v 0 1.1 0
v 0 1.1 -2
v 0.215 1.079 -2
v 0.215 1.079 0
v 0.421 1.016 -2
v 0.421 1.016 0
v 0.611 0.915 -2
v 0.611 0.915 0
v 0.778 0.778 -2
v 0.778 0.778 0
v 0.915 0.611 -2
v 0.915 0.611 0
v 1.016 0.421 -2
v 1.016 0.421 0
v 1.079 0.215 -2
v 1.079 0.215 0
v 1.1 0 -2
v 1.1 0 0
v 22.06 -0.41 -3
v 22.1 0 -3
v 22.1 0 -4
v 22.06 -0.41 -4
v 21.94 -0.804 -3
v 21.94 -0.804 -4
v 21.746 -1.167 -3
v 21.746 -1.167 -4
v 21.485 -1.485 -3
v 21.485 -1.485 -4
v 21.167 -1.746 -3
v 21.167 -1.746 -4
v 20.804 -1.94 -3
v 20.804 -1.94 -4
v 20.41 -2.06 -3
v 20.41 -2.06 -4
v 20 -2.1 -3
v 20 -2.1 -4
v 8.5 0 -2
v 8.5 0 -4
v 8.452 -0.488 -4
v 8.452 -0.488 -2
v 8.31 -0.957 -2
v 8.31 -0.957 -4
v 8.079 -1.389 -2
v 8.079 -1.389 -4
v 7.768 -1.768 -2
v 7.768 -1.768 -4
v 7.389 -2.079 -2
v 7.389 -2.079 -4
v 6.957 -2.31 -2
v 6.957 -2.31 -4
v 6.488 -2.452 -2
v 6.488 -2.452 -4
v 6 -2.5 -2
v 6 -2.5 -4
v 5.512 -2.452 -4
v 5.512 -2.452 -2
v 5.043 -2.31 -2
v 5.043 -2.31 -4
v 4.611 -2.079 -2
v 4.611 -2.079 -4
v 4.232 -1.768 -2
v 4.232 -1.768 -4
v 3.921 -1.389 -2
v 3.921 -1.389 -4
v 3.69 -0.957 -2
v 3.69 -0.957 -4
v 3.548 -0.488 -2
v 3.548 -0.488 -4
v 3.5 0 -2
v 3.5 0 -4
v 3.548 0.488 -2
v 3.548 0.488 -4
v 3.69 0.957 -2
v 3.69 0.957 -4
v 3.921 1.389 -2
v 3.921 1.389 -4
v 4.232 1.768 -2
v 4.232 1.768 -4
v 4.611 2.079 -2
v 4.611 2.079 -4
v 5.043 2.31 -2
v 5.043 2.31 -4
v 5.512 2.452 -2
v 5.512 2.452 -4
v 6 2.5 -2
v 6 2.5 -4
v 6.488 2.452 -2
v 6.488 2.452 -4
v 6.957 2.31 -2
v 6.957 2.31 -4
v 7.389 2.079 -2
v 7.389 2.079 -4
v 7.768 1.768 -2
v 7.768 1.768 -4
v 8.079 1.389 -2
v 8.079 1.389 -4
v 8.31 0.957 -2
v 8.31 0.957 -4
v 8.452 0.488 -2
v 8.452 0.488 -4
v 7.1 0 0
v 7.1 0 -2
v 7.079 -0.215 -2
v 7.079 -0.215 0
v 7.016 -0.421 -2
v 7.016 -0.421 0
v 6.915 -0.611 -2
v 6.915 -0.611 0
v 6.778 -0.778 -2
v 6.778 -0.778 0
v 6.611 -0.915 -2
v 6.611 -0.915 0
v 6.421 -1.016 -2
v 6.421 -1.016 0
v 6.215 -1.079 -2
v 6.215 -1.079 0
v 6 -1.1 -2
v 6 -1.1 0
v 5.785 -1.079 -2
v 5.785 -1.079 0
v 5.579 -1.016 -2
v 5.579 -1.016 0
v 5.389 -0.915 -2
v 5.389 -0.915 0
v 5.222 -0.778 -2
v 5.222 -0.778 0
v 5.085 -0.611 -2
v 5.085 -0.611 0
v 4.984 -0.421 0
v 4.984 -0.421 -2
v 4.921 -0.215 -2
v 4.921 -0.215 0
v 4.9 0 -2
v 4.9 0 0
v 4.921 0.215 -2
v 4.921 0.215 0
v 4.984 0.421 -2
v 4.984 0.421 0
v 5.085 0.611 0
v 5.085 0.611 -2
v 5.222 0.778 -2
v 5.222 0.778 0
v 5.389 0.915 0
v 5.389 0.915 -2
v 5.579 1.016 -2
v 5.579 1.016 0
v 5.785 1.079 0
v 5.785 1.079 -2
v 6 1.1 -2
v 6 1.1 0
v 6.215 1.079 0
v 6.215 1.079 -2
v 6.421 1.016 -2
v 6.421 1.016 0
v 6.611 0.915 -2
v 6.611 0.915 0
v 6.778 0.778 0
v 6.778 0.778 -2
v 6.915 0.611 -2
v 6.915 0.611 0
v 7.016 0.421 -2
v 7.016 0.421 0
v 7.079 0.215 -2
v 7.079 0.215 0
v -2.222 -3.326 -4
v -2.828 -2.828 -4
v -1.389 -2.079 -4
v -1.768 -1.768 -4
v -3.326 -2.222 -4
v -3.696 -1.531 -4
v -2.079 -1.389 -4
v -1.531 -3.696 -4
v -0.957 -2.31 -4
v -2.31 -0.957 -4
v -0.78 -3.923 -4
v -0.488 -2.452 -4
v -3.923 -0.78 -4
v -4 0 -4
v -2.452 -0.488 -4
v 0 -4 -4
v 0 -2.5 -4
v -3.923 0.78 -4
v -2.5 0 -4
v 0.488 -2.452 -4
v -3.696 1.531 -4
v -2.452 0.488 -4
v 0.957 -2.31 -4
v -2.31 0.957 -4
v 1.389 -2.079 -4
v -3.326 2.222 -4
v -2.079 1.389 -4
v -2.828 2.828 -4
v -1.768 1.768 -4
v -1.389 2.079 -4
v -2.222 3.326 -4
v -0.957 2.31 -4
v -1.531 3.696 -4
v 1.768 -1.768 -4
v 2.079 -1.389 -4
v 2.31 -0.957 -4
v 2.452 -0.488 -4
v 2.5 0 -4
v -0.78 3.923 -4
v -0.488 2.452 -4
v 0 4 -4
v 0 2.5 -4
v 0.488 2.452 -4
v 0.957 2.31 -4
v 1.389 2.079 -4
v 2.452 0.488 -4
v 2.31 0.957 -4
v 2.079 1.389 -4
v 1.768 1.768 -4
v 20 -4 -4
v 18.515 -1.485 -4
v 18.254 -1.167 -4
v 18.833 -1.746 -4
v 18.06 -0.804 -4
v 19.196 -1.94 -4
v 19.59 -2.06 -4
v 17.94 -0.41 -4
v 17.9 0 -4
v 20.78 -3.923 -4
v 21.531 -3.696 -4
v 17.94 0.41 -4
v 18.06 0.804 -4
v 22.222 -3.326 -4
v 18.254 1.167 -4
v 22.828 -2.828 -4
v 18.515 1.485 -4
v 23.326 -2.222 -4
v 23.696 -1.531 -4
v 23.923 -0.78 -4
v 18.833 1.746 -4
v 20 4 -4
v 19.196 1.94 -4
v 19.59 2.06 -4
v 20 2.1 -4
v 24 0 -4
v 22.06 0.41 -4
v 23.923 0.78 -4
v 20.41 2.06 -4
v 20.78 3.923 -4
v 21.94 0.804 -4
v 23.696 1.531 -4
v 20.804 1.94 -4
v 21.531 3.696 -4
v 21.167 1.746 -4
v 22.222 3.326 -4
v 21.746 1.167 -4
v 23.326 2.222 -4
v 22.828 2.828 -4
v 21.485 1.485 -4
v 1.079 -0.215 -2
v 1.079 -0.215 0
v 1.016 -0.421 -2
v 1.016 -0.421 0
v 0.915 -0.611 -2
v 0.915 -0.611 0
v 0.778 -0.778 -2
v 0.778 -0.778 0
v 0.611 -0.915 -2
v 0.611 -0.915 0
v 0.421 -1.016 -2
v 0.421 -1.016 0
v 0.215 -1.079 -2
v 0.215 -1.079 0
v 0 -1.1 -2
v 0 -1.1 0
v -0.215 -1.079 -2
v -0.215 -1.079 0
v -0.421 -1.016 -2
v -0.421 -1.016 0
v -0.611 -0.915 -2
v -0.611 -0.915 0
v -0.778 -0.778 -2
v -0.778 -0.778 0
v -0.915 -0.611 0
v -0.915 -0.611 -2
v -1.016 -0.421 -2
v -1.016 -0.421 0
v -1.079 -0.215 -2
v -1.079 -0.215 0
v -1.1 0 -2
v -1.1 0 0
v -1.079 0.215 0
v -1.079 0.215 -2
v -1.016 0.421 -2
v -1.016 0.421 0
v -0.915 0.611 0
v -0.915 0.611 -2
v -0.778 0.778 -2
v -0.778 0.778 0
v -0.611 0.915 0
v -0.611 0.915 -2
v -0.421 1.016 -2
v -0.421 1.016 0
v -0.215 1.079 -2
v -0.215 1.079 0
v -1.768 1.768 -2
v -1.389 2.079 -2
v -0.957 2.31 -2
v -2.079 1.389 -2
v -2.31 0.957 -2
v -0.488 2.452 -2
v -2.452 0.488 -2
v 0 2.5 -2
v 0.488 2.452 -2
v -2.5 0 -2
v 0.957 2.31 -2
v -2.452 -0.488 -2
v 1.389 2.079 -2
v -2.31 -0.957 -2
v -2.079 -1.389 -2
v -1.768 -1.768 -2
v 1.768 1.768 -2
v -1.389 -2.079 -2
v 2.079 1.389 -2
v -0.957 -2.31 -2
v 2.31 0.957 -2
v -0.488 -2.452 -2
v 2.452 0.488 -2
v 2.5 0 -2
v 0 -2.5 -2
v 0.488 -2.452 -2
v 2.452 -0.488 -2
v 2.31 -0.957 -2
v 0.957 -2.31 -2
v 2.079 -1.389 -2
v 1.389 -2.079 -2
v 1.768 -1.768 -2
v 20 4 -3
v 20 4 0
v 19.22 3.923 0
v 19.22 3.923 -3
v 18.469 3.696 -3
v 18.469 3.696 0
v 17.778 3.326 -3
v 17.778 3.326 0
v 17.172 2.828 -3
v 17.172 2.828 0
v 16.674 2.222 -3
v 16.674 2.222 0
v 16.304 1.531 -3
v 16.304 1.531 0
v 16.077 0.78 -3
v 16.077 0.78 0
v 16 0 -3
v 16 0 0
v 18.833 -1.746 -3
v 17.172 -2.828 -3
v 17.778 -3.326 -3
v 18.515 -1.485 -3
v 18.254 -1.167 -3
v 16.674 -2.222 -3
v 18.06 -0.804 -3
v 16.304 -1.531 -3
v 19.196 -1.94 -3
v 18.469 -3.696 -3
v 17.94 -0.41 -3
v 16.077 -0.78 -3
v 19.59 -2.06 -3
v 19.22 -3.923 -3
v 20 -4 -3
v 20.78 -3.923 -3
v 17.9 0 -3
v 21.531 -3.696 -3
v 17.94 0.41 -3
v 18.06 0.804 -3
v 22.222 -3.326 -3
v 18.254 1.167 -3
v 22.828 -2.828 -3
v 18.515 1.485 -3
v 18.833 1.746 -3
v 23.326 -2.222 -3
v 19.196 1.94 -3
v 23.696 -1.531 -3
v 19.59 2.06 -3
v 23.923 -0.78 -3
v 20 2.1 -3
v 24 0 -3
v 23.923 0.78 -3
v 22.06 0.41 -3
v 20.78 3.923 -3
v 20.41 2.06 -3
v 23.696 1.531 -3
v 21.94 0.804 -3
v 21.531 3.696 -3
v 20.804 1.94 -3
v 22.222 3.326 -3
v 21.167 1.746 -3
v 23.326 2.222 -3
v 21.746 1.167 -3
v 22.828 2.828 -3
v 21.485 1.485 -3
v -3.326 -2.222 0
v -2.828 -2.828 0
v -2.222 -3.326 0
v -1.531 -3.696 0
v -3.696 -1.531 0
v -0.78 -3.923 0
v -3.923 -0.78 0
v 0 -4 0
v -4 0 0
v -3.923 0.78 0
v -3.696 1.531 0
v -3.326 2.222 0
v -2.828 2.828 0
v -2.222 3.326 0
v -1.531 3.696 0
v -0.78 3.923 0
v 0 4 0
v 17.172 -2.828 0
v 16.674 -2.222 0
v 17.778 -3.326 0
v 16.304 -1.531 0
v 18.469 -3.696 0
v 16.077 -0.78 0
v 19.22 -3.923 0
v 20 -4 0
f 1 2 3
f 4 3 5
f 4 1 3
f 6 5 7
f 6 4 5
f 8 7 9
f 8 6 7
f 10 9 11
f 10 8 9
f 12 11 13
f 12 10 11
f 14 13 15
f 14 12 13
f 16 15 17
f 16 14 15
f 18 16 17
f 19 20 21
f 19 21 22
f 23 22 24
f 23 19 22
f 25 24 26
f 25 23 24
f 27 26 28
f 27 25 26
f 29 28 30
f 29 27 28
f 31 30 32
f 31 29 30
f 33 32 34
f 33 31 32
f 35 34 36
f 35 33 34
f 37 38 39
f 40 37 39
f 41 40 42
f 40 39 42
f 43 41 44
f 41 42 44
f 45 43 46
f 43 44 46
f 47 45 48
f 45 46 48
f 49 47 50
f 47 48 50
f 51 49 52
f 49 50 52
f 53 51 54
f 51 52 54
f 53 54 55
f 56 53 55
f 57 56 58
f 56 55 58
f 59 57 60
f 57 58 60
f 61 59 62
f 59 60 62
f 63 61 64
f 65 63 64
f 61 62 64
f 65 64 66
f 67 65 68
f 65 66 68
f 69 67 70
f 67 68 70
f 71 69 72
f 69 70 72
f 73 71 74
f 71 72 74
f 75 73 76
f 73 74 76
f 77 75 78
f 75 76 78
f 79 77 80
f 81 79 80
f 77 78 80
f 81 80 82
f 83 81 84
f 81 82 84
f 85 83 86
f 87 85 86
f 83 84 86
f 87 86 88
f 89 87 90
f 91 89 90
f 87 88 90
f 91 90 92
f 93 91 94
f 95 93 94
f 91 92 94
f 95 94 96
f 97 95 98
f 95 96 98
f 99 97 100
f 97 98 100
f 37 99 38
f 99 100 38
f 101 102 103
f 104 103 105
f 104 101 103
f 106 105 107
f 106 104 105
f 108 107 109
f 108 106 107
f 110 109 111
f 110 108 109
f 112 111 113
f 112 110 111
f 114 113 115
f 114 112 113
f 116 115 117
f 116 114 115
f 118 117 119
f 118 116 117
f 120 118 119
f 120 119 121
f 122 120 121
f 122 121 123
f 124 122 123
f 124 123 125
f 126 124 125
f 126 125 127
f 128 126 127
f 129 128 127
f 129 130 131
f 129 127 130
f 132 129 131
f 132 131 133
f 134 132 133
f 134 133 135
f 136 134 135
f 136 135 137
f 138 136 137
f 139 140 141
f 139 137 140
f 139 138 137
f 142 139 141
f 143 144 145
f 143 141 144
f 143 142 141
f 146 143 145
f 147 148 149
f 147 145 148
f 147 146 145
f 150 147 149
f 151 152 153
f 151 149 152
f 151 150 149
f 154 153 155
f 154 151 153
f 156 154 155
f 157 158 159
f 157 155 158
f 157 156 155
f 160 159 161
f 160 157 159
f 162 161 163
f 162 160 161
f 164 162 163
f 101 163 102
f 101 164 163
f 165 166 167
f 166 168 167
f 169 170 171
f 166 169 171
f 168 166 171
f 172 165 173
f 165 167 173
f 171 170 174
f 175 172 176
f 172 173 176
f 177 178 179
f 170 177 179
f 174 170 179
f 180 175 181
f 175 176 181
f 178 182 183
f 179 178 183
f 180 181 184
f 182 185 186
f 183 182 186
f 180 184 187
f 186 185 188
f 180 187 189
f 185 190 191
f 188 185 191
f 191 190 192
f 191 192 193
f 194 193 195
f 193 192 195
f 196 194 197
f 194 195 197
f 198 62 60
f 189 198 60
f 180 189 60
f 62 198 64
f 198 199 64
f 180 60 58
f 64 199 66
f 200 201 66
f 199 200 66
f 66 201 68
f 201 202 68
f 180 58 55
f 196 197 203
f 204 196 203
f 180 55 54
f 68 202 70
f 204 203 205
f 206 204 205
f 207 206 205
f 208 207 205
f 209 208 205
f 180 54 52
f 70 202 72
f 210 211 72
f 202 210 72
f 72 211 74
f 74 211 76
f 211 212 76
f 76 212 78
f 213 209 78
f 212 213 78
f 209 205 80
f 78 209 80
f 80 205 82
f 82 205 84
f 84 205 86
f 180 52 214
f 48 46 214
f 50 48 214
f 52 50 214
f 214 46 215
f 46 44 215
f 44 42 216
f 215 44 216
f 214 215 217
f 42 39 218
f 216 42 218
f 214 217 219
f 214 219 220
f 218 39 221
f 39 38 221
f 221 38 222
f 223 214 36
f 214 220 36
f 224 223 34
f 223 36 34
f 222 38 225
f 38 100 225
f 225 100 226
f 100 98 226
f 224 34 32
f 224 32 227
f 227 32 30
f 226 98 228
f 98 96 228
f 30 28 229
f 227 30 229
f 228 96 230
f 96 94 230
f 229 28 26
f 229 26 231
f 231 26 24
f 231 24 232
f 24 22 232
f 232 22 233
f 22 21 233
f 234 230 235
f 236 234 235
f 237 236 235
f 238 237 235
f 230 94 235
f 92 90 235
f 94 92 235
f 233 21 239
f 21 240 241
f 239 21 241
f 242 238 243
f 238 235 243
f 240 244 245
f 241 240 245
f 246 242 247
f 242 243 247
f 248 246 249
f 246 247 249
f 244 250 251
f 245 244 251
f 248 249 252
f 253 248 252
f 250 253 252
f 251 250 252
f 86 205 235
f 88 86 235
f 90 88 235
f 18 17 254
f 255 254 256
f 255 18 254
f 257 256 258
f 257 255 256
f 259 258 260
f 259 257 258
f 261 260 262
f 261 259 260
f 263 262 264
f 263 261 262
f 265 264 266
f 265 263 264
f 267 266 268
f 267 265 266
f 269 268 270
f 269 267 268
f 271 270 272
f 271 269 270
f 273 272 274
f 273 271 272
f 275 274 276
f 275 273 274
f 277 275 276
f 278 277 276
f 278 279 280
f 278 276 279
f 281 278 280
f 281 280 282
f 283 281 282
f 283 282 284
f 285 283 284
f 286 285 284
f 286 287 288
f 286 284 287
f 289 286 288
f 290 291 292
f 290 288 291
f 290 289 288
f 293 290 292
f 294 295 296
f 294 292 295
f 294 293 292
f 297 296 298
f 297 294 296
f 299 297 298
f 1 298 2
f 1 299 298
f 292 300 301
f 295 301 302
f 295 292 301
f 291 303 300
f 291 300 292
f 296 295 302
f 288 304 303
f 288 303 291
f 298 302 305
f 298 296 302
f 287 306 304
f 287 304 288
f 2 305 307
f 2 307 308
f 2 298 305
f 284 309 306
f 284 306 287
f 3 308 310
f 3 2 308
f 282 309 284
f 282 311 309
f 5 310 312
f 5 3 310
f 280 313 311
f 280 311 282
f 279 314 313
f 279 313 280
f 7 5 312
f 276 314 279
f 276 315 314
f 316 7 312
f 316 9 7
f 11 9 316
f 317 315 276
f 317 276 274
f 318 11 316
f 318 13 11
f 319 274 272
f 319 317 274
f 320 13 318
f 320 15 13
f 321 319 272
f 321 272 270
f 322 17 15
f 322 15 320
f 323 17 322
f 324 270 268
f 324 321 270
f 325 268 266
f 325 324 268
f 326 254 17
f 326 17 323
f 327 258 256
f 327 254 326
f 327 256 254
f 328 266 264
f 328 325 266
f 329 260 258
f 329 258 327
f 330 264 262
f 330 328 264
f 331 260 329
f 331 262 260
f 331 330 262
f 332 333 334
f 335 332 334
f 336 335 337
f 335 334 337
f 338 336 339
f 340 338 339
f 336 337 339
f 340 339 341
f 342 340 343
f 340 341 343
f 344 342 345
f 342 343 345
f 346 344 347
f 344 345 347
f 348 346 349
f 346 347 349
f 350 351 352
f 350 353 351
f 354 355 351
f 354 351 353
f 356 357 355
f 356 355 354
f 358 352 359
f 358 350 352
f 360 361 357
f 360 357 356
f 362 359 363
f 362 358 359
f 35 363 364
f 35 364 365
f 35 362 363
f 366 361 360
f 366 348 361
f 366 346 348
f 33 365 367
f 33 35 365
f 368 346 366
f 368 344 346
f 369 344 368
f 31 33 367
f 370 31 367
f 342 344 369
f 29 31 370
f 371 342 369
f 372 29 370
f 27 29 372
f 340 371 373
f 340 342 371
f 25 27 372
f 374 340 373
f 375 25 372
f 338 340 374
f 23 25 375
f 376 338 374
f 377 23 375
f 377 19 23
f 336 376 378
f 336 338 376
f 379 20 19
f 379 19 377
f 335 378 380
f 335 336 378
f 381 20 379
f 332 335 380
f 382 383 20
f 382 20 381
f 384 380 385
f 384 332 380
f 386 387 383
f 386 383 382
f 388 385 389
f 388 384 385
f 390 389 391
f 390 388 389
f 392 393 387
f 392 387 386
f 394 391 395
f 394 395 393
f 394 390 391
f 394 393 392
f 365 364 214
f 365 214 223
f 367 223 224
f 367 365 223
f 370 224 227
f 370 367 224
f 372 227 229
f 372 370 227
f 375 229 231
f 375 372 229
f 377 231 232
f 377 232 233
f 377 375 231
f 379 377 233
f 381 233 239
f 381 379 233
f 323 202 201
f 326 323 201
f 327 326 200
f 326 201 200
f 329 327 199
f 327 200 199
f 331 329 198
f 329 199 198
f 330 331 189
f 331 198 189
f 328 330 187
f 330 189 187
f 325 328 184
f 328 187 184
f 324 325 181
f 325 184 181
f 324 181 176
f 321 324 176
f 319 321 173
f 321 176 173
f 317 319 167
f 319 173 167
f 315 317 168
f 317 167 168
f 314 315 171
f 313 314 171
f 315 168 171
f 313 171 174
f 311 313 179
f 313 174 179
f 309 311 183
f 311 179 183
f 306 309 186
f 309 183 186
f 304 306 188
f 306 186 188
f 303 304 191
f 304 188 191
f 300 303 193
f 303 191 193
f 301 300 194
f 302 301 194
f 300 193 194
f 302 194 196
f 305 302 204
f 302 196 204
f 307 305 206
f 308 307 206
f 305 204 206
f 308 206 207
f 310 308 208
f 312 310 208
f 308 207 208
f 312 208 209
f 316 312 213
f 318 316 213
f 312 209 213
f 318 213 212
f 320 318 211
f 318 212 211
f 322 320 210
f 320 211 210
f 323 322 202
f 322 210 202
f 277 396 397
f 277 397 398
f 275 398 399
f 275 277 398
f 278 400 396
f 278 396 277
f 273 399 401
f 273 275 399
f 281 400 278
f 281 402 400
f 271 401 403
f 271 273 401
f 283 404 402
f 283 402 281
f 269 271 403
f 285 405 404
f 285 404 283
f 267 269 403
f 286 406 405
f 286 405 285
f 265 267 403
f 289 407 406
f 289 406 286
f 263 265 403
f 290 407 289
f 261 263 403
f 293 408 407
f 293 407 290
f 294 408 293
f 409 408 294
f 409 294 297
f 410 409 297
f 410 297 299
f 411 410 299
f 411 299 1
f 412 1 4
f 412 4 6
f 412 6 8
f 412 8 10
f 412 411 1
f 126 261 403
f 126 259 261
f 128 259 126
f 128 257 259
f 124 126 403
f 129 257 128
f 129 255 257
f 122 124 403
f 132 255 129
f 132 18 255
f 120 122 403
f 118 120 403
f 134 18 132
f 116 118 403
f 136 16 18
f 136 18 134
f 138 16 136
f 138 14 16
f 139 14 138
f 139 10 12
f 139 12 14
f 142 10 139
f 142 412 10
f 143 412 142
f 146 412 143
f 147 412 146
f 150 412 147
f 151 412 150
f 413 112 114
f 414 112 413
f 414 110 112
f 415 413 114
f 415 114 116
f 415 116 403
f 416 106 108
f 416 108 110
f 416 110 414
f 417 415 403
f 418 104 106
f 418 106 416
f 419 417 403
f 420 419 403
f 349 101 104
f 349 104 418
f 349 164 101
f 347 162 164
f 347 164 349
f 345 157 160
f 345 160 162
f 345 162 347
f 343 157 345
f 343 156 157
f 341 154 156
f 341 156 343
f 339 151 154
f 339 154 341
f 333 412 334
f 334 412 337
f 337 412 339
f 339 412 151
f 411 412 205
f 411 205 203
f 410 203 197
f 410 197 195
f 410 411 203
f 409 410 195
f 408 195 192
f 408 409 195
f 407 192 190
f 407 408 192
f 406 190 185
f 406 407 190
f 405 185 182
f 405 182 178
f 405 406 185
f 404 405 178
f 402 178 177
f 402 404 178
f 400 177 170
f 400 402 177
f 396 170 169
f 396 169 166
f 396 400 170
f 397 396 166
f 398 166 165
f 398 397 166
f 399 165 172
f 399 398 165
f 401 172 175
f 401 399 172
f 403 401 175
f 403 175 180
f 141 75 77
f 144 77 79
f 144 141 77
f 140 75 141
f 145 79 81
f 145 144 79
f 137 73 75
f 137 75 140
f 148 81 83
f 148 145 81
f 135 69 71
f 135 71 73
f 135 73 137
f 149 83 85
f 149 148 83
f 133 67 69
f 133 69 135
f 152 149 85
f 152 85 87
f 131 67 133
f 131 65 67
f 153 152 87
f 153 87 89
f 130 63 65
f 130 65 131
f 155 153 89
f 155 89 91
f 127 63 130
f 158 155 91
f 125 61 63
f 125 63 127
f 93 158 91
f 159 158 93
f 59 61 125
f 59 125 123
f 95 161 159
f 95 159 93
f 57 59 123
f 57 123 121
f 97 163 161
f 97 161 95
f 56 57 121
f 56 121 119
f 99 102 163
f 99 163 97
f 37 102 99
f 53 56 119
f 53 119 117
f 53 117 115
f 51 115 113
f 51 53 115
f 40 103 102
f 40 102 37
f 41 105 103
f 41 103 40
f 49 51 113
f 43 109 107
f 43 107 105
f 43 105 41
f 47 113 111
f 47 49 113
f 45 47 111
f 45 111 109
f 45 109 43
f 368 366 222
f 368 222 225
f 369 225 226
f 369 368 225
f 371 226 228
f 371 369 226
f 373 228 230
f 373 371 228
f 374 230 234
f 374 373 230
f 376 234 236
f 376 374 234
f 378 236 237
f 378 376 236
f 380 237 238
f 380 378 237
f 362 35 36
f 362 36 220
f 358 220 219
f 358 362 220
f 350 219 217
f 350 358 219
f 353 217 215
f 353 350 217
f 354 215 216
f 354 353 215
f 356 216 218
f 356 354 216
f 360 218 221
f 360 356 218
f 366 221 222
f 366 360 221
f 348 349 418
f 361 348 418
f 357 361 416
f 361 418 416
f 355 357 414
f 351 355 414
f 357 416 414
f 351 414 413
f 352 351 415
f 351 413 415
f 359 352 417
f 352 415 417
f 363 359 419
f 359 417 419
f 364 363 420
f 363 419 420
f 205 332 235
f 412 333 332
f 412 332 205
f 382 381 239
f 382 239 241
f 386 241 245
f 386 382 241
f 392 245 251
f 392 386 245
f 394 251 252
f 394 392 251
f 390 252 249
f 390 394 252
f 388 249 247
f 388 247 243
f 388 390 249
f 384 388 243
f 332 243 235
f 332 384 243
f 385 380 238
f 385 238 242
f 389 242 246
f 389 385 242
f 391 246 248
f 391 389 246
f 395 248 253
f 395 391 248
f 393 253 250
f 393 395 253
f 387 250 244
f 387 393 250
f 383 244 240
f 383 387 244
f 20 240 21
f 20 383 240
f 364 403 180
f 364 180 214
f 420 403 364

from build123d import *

# Parameters (mm, degrees)
F1_DEPTH = 4
F2_DEPTH = 3
F3_R     = 2.5
F4_DEPTH = 2


with BuildPart() as f1:
    # F0 (on Top) → F1 (new body)
    with BuildSketch(Plane.XY):
        with BuildLine():
            ThreePointArc((0, 1.1), (0.7778174593, 0.7778174593), (1.1, 0))
            Line((1.1, 0), (4, 0))
            ThreePointArc((4, 0), (2.8284271247, 2.8284271247), (0, 4))
            Line((0, 4), (0, 1.1))
        make_face()
        with BuildLine():
            Line((4, 0), (1.1, 0))
            ThreePointArc((1.1, 0), (-0.7778174593, -0.7778174593), (0, 1.1))
            Line((0, 1.1), (0, 4))
            ThreePointArc((0, 4), (-4, 0), (0, -4))
            ThreePointArc((0, -4), (2.8284271247, -2.8284271247), (4, 0))
        make_face()
        with BuildLine():
            ThreePointArc((0, 4), (2.8284271247, 2.8284271247), (4, 0))
            Line((4, 0), (4.9, 0))
            ThreePointArc((4.9, 0), (6, 1.1), (7.1, 0))
            Line((7.1, 0), (16, 0))
            ThreePointArc((16, 0), (17.1715728753, 2.8284271247), (20, 4))
            Line((20, 4), (0, 4))
        make_face()
        with BuildLine():
            Line((4.9, 0), (4, 0))
            ThreePointArc((4, 0), (2.8284271247, -2.8284271247), (0, -4))
            Line((0, -4), (20, -4))
            ThreePointArc((20, -4), (17.1715728753, -2.8284271247), (16, 0))
            Line((16, 0), (7.1, 0))
            ThreePointArc((7.1, 0), (6, -1.1), (4.9, 0))
        make_face()
        with BuildLine():
            Line((20, 2.1), (20, 4))
            ThreePointArc((20, 4), (17.1715728753, 2.8284271247), (16, 0))
            Line((16, 0), (17.9, 0))
            ThreePointArc((17.9, 0), (18.5150757595, 1.4849242405), (20, 2.1))
        make_face()
        with BuildLine():
            ThreePointArc((24, 0), (22.8284271247, 2.8284271247), (20, 4))
            Line((20, 4), (20, 2.1))
            ThreePointArc((20, 2.1), (21.4849242405, 1.4849242405), (22.1, 0))
            ThreePointArc((22.1, 0), (21.4849242405, -1.4849242405), (20, -2.1))
            Line((20, -2.1), (20, -4))
            ThreePointArc((20, -4), (22.8284271247, -2.8284271247), (24, 0))
        make_face()
        with BuildLine():
            ThreePointArc((16, 0), (17.1715728753, -2.8284271247), (20, -4))
            Line((20, -4), (20, -2.1))
            ThreePointArc((20, -2.1), (18.5150757595, -1.4849242405), (17.9, 0))
            Line((17.9, 0), (16, 0))
        make_face()
    extrude(amount=-F1_DEPTH)

    # F0 (on Top) → F2 (cut)
    with BuildSketch(Plane.XY):
        with BuildLine():
            ThreePointArc((16, 0), (17.1715728753, -2.8284271247), (20, -4))
            Line((20, -4), (20, -2.1))
            ThreePointArc((20, -2.1), (18.5150757595, -1.4849242405), (17.9, 0))
            Line((17.9, 0), (16, 0))
        make_face()
        with BuildLine():
            Line((20, 2.1), (20, 4))
            ThreePointArc((20, 4), (17.1715728753, 2.8284271247), (16, 0))
            Line((16, 0), (17.9, 0))
            ThreePointArc((17.9, 0), (18.5150757595, 1.4849242405), (20, 2.1))
        make_face()
        with BuildLine():
            ThreePointArc((24, 0), (22.8284271247, 2.8284271247), (20, 4))
            Line((20, 4), (20, 2.1))
            ThreePointArc((20, 2.1), (21.4849242405, 1.4849242405), (22.1, 0))
            ThreePointArc((22.1, 0), (21.4849242405, -1.4849242405), (20, -2.1))
            Line((20, -2.1), (20, -4))
            ThreePointArc((20, -4), (22.8284271247, -2.8284271247), (24, 0))
        make_face()
    extrude(amount=-F2_DEPTH, mode=Mode.SUBTRACT)

    # F3 (on face) → F4 (cut)
    with BuildSketch(Plane(origin=(0, 0, -4), x_dir=(1, 0, 0), z_dir=(0, 0, -1))):
        with Locations((6, 0)):
            Circle(F3_R)
        Circle(F3_R)
    extrude(amount=-F4_DEPTH, mode=Mode.SUBTRACT)


solid = f1.part
